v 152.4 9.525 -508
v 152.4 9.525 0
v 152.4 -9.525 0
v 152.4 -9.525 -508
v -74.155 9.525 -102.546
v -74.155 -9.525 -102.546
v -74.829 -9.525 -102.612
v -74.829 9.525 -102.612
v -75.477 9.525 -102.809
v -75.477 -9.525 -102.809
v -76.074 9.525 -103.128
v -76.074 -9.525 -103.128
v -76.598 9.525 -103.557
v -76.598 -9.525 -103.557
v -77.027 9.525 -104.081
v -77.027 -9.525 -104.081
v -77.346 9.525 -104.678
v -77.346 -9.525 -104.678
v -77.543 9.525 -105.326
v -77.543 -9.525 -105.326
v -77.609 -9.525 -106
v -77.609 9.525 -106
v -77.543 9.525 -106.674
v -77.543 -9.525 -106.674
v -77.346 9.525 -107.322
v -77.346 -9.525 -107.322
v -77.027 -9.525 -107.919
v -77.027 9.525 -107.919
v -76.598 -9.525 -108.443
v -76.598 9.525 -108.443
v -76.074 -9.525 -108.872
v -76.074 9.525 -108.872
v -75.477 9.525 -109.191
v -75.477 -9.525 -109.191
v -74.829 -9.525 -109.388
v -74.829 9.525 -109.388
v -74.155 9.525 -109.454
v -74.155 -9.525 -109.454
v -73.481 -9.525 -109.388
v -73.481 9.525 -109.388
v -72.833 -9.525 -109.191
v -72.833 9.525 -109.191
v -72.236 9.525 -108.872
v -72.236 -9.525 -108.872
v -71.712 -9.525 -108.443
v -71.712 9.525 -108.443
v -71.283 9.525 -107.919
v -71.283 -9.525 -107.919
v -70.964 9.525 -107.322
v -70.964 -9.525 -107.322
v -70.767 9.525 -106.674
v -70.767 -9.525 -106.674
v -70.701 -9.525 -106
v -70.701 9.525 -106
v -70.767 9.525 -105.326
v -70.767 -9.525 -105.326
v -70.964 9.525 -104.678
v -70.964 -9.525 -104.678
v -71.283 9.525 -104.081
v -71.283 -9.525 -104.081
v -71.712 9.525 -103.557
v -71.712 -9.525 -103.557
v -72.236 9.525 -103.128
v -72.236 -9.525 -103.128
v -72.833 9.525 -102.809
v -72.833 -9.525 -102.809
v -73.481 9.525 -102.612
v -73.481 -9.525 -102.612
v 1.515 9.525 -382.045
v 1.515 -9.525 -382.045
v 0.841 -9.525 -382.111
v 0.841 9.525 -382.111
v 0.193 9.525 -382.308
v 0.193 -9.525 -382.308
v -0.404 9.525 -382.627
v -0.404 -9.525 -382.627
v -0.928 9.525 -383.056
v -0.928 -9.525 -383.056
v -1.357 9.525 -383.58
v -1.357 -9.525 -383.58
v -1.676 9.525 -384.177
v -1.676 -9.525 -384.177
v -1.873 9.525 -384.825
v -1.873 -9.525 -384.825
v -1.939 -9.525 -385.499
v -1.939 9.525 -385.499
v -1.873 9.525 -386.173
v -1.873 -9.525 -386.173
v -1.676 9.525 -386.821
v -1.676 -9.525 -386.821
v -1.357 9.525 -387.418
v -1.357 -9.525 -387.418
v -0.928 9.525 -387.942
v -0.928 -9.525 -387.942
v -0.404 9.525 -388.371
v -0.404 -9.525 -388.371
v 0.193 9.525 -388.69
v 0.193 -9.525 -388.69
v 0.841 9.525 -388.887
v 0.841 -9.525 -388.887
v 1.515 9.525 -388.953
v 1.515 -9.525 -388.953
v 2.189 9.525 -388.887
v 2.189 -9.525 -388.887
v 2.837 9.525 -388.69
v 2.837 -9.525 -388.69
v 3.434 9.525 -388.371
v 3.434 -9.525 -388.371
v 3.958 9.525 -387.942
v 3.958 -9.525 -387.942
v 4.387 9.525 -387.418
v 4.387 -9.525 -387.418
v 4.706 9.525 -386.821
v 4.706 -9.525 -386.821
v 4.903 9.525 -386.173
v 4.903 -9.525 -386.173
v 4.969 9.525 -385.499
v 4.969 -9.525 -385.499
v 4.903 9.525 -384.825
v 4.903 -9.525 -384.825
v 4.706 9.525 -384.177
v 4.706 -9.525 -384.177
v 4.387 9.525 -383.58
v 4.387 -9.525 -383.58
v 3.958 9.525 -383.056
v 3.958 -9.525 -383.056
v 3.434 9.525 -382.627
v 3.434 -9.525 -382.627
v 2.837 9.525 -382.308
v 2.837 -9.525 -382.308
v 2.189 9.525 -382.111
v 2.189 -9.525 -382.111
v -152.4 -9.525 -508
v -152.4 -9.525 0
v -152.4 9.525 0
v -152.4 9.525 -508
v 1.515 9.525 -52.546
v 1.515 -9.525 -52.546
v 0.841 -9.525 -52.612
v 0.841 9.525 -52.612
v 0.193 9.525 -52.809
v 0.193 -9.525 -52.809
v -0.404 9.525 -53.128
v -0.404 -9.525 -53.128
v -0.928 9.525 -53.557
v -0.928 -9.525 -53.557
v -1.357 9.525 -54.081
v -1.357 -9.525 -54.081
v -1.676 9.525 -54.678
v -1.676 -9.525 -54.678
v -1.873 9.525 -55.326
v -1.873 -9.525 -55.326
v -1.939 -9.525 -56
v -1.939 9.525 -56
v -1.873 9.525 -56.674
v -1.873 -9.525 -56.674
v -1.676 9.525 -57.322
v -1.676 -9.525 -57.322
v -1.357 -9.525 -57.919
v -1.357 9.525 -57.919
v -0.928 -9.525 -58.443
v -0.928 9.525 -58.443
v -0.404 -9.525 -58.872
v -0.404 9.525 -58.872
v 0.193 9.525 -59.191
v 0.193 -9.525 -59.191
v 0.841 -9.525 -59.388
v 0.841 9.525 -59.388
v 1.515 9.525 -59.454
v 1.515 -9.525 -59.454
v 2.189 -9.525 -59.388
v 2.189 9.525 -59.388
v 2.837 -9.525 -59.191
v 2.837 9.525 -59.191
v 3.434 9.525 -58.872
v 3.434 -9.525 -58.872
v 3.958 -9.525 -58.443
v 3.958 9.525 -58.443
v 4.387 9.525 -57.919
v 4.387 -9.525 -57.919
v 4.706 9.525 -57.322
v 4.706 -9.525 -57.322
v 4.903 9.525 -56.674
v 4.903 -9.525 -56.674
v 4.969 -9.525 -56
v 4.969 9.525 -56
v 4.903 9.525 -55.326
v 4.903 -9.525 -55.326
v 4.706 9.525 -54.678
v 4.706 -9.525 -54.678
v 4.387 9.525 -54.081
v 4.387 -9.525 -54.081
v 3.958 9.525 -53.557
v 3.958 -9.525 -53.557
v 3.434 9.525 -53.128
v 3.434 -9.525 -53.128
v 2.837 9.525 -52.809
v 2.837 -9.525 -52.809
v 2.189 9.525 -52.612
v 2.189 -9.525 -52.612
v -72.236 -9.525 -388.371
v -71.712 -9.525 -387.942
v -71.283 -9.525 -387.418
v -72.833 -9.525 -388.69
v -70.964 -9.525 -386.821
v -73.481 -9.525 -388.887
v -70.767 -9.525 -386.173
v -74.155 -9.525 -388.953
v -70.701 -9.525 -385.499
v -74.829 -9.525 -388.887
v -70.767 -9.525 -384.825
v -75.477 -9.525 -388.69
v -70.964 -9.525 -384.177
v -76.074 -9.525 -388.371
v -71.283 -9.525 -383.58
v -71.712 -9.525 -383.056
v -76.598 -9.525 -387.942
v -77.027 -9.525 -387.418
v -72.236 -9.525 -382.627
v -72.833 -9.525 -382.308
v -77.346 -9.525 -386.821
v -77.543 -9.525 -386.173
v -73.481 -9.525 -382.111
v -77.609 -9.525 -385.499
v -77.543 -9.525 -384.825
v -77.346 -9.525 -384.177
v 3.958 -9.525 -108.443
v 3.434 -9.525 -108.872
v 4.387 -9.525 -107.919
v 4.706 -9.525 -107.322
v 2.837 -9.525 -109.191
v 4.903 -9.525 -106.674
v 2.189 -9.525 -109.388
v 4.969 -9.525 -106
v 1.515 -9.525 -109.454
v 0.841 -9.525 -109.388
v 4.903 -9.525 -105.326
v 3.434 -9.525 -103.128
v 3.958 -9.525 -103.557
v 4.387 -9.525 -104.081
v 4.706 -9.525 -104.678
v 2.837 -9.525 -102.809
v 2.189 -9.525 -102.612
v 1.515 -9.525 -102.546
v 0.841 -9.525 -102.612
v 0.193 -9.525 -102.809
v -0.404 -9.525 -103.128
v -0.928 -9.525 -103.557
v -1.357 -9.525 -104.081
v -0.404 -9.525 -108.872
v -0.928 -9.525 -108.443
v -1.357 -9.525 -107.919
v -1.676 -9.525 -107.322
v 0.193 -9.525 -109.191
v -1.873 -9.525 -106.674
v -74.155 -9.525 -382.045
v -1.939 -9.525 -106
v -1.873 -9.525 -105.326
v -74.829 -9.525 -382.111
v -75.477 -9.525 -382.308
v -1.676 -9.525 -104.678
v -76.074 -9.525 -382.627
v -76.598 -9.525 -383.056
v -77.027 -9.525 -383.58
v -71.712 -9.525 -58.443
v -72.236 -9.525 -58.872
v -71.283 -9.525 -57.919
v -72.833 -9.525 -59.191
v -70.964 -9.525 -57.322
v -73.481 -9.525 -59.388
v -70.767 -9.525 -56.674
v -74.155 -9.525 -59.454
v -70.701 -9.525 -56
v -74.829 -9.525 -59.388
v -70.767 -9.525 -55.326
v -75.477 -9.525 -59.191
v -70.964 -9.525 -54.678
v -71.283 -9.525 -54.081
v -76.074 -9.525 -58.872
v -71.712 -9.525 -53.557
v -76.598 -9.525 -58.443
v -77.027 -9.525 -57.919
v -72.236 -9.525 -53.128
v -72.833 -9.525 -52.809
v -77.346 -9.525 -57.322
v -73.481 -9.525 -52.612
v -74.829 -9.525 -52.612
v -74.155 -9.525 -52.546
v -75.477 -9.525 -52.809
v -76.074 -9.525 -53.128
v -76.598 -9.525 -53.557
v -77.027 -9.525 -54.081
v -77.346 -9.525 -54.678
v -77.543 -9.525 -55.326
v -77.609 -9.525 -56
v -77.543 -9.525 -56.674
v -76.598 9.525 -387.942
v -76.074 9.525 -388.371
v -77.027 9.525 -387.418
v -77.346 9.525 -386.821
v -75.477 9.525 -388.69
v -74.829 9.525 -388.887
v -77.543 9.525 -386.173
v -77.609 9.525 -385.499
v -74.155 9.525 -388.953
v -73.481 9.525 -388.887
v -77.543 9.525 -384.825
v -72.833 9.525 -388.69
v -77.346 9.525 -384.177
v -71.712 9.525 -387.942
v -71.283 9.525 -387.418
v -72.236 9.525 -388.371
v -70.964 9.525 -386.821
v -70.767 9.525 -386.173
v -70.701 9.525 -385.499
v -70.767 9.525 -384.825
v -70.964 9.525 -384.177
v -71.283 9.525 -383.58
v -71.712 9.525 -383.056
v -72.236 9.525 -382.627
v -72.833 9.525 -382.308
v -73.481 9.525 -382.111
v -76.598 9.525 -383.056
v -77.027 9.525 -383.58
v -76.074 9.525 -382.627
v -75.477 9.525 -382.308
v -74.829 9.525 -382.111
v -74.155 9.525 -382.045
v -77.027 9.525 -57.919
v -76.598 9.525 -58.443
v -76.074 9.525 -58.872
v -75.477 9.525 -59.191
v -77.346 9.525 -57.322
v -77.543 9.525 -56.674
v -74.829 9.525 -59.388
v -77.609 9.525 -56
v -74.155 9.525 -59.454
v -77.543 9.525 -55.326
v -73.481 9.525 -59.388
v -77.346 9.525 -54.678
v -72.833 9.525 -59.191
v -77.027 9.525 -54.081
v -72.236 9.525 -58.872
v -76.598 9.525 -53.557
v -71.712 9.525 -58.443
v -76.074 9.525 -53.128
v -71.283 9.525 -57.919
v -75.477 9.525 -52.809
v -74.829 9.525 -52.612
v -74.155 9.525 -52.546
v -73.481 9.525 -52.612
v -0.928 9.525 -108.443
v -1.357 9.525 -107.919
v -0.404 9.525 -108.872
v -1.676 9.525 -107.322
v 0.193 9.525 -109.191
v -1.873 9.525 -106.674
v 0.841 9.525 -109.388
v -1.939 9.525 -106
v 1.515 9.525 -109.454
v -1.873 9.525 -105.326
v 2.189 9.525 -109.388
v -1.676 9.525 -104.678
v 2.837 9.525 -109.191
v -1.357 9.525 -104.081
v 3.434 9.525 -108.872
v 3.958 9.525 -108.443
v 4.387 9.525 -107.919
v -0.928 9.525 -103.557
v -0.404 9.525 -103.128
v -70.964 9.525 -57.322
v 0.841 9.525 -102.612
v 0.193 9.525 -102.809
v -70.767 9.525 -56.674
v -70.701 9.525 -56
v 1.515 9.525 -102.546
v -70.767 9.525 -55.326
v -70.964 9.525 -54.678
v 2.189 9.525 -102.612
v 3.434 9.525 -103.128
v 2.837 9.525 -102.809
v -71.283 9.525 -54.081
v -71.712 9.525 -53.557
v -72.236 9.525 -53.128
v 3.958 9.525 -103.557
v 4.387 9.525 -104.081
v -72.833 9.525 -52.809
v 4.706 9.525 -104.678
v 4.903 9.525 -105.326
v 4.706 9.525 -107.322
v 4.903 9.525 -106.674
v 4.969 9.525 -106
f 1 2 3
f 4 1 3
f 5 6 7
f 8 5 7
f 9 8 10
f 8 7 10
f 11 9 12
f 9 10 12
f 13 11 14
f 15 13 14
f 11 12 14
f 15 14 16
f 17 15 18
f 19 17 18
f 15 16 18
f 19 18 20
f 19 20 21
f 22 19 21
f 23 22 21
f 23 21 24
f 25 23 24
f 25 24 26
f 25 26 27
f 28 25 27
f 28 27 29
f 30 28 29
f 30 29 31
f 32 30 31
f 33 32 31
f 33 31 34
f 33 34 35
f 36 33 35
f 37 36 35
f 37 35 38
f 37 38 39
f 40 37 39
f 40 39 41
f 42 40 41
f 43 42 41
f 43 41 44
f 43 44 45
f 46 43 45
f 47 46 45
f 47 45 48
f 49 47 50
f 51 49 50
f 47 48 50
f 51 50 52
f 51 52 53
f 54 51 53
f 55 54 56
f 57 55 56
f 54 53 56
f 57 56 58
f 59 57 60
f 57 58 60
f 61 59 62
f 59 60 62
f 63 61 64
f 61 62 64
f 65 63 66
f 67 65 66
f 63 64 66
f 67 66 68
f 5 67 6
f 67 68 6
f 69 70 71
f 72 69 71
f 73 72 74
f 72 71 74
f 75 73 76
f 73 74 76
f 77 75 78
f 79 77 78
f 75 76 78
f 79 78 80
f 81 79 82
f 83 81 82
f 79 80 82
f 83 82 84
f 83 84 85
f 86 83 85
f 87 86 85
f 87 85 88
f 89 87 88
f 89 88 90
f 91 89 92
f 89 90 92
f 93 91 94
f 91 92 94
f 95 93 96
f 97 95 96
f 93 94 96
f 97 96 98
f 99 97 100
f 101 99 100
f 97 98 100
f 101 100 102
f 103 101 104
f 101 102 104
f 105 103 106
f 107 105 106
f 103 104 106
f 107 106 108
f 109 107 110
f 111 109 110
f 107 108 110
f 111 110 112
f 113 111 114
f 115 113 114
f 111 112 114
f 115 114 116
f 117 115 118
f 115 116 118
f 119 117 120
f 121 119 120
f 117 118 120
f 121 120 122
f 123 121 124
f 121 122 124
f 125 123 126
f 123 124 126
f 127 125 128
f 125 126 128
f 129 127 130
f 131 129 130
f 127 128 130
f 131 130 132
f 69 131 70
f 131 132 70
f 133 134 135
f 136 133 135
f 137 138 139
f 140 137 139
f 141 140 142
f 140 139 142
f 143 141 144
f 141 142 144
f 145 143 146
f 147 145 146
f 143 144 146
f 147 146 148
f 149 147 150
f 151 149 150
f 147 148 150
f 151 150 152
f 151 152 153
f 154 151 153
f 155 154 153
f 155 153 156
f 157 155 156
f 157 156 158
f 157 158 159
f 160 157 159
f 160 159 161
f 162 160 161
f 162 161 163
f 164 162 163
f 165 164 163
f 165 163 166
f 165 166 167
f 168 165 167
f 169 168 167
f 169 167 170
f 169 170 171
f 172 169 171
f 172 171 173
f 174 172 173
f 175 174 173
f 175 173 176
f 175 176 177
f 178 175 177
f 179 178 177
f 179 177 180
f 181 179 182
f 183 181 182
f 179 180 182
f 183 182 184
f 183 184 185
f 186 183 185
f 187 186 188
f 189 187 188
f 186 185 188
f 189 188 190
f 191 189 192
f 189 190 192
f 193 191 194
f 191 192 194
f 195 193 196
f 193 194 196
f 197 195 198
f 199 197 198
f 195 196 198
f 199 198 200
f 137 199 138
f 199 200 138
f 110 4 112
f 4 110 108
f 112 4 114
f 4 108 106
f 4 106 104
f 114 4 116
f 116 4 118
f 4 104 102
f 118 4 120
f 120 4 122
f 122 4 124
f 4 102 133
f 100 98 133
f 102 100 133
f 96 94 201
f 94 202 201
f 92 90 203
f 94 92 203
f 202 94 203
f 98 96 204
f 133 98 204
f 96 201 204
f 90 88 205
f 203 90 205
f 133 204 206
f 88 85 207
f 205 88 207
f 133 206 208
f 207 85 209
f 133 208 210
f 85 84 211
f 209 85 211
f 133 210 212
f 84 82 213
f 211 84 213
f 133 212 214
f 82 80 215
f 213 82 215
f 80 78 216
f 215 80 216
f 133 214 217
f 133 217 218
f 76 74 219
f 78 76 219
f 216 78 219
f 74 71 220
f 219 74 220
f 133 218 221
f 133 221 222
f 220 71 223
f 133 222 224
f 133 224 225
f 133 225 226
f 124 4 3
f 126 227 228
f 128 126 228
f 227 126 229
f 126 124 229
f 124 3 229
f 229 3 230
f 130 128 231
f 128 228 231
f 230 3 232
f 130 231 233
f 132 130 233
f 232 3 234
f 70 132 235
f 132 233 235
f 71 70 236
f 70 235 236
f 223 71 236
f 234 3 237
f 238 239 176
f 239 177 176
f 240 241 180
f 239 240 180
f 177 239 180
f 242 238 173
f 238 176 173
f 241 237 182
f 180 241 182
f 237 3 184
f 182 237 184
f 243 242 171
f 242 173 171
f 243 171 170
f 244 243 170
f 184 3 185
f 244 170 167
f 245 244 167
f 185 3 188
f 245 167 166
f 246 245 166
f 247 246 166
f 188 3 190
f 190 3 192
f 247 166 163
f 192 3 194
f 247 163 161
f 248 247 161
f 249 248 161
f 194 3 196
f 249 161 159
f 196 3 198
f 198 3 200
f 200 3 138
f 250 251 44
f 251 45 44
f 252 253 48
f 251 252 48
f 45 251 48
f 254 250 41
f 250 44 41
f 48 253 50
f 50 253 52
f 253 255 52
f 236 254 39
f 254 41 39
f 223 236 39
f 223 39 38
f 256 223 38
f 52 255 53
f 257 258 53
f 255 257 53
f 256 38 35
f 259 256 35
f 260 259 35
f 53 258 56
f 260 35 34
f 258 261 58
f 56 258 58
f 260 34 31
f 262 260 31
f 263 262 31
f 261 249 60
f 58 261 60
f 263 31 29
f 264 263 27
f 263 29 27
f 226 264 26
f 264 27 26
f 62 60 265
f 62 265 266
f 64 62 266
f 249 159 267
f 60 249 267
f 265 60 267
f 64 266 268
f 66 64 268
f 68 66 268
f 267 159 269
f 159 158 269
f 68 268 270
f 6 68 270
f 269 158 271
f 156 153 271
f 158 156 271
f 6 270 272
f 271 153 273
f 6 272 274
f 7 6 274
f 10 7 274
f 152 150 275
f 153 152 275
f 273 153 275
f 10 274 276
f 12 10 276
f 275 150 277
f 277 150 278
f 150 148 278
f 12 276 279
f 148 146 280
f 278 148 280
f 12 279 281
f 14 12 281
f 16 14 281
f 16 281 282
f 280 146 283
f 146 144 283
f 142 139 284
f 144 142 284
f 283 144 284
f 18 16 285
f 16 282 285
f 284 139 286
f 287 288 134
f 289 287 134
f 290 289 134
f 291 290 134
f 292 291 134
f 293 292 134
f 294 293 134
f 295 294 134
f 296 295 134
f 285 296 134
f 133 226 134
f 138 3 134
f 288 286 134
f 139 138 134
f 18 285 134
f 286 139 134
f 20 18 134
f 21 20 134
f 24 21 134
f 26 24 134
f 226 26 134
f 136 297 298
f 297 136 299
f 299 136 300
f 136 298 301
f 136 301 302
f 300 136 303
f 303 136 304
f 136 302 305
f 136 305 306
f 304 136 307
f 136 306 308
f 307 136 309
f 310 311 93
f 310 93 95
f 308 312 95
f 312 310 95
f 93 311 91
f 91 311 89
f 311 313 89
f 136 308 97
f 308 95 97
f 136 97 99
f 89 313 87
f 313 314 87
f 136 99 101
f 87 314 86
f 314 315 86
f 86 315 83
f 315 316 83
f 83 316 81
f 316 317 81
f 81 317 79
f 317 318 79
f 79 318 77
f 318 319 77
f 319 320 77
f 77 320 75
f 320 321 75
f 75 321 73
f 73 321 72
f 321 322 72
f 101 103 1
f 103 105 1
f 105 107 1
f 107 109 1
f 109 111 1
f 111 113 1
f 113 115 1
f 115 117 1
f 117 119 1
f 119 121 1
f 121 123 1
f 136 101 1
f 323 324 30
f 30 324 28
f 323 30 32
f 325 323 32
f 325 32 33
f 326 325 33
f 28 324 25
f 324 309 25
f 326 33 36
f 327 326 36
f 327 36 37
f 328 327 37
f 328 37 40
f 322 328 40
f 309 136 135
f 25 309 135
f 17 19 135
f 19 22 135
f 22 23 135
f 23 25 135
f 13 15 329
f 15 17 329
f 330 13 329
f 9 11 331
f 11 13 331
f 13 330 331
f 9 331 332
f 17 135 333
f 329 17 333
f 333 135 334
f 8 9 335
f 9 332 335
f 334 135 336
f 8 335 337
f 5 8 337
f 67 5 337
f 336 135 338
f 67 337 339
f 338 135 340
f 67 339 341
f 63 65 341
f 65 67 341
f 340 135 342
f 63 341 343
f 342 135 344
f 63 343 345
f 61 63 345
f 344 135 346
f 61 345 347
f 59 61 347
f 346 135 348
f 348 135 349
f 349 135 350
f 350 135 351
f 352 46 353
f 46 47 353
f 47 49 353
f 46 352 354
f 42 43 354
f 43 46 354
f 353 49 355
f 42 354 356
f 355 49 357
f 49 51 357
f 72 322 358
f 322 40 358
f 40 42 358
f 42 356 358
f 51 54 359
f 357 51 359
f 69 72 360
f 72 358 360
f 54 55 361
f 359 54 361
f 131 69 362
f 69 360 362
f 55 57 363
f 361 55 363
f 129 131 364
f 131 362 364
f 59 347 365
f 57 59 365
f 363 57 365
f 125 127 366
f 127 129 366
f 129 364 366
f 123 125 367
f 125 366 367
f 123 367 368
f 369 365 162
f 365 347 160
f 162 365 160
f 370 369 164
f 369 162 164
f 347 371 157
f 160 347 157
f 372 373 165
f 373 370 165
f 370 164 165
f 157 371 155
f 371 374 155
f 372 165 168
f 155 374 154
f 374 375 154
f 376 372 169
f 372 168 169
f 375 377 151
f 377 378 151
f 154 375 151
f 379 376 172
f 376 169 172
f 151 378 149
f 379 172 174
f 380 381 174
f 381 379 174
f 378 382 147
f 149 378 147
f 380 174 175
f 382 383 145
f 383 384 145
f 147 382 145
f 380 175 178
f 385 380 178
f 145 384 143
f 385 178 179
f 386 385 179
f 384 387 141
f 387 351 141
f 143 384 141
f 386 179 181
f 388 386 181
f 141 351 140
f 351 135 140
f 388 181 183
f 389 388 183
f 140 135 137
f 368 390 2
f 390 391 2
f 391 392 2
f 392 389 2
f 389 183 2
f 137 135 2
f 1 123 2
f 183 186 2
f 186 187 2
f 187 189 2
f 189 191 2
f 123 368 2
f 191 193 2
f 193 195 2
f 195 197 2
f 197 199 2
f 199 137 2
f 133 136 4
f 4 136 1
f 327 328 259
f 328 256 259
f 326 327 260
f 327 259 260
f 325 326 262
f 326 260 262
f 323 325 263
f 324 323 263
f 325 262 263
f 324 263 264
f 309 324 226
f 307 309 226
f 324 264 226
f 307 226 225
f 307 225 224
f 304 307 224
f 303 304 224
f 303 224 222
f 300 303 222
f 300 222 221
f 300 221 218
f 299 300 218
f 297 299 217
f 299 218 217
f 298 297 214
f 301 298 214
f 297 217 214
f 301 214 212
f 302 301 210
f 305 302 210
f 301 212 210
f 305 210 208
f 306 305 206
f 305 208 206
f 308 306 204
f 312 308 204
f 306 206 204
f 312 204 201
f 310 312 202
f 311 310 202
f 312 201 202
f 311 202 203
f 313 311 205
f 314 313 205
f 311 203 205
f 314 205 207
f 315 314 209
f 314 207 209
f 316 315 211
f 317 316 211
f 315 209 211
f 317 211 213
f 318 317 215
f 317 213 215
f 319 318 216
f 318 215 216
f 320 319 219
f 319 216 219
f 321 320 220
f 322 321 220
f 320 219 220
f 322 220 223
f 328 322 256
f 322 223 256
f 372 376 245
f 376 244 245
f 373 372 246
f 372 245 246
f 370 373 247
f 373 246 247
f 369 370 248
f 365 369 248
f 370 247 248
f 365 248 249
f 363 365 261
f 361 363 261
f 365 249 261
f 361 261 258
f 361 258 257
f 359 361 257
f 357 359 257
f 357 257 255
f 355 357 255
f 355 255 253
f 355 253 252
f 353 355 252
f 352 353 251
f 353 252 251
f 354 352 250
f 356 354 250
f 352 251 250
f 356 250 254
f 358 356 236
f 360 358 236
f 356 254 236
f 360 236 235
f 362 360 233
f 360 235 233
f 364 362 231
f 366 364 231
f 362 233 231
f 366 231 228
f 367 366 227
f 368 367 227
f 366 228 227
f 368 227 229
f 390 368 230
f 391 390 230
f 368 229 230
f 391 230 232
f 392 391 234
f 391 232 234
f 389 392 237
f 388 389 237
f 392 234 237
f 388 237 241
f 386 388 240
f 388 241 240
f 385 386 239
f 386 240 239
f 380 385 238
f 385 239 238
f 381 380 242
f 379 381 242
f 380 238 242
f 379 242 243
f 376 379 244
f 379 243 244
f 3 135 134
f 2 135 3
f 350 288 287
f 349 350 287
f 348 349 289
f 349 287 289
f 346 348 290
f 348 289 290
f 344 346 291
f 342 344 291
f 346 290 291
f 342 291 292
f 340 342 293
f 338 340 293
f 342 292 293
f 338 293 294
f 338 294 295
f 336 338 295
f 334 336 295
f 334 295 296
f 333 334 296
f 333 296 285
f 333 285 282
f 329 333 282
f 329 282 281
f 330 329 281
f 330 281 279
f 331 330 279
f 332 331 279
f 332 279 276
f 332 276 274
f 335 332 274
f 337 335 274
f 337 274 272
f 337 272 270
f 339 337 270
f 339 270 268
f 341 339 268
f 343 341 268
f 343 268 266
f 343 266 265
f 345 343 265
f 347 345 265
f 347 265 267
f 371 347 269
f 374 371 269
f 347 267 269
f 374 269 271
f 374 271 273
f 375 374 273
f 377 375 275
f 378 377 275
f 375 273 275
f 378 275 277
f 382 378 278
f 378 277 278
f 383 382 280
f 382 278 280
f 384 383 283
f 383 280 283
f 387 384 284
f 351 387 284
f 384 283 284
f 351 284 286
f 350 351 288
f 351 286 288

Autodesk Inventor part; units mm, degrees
ref_plane "YZ Plane" through (0, 0, 0) normal (1, 0, 0) x (0, 1, 0)
ref_plane "XZ Plane" through (0, 0, 0) normal (0, 1, 0) x (-1, 0, 0)
ref_plane "XY Plane" through (0, 0, 0) normal (0, 0, 1) x (1, 0, 0)
sketch "Sketch1" plane through (0, 0, 0) normal (0, 0, 1) x (1, 0, 0)
  line L0 (-152.4, 9.525) -> (152.4, 9.525)
  line L1 (152.4, 9.525) -> (152.4, -9.525)
  line L2 (152.4, -9.525) -> (-152.4, -9.525)
  line L3 (-152.4, -9.525) -> (-152.4, 9.525)
  line L4 (-152.4, 9.525) -> (152.4, -9.525) construction
  line L5 (152.4, 9.525) -> (-152.4, -9.525) construction
  point P0 (0, 0)
  dimension "d0" = 304.8
  dimension "d1" = 19.05
extrude "Extrusion1" add sketch "Sketch1" against normal blind 508
sketch "Sketch2" plane through (-152.4, 9.525, 0) normal (0, 1, 0) x (1, 0, 0)
  line L0 (0, 0) -> (0, 508) projected
  line L1 (0, 0) -> (304.8, 0) projected
  point P0 (152.4, 0)
  point P1 (78.245, 56)
  dimension "d4" = 78.245
  dimension "d5" = 56
hole "Hole1" at (-74.155, 9.525, -56) direction (0, -1, 0) diameter 6.9088 end through all
pattern_linear "Rectangular Pattern1" count 2 spacing 50 along (0, 0, -1) count 2 spacing 75.67 along (1, 0, 0) of "Hole1"
pattern_linear "Rectangular Pattern2" count 2 spacing 329.499 along (0, 0, -1) count 2 spacing 75.67 along (1, 0, 0) of "Hole1"
equation "\"d0\" = mp_wid"
equation "\"d1\" = mp_thick"
equation "\"d2\" = mp_len"
equation "\"d4\" = mp_mbra_holes_w_offset"
equation "\"d5\" = mp_mbra_holes_l_offset"
equation "\"d15\" = mp_mbra_holes_l_spacing"
equation "\"d18\" = mp_mbra_holes_w_spacing"
equation "\"d21\" = mp_bk_holes_distance"
equation "\"d24\" = mp_mbra_holes_w_spacing"
equation "\"mp_wid\" = 304.8"
equation "\"mp_thick\" = 19.05"
equation "\"mp_len\" = 508"
equation "\"mp_mbra_holes_l_spacing\" = 50"
equation "\"mp_mbra_holes_w_spacing\" = 75.67"
equation "\"mp_bk_holes_distance\" = 329.49896"
equation "\"mp_mbra_holes_w_offset\" = 78.245"
equation "\"mp_mbra_holes_l_offset\" = 56"
properties part number "mplate03" material "Aluminum 6061"
